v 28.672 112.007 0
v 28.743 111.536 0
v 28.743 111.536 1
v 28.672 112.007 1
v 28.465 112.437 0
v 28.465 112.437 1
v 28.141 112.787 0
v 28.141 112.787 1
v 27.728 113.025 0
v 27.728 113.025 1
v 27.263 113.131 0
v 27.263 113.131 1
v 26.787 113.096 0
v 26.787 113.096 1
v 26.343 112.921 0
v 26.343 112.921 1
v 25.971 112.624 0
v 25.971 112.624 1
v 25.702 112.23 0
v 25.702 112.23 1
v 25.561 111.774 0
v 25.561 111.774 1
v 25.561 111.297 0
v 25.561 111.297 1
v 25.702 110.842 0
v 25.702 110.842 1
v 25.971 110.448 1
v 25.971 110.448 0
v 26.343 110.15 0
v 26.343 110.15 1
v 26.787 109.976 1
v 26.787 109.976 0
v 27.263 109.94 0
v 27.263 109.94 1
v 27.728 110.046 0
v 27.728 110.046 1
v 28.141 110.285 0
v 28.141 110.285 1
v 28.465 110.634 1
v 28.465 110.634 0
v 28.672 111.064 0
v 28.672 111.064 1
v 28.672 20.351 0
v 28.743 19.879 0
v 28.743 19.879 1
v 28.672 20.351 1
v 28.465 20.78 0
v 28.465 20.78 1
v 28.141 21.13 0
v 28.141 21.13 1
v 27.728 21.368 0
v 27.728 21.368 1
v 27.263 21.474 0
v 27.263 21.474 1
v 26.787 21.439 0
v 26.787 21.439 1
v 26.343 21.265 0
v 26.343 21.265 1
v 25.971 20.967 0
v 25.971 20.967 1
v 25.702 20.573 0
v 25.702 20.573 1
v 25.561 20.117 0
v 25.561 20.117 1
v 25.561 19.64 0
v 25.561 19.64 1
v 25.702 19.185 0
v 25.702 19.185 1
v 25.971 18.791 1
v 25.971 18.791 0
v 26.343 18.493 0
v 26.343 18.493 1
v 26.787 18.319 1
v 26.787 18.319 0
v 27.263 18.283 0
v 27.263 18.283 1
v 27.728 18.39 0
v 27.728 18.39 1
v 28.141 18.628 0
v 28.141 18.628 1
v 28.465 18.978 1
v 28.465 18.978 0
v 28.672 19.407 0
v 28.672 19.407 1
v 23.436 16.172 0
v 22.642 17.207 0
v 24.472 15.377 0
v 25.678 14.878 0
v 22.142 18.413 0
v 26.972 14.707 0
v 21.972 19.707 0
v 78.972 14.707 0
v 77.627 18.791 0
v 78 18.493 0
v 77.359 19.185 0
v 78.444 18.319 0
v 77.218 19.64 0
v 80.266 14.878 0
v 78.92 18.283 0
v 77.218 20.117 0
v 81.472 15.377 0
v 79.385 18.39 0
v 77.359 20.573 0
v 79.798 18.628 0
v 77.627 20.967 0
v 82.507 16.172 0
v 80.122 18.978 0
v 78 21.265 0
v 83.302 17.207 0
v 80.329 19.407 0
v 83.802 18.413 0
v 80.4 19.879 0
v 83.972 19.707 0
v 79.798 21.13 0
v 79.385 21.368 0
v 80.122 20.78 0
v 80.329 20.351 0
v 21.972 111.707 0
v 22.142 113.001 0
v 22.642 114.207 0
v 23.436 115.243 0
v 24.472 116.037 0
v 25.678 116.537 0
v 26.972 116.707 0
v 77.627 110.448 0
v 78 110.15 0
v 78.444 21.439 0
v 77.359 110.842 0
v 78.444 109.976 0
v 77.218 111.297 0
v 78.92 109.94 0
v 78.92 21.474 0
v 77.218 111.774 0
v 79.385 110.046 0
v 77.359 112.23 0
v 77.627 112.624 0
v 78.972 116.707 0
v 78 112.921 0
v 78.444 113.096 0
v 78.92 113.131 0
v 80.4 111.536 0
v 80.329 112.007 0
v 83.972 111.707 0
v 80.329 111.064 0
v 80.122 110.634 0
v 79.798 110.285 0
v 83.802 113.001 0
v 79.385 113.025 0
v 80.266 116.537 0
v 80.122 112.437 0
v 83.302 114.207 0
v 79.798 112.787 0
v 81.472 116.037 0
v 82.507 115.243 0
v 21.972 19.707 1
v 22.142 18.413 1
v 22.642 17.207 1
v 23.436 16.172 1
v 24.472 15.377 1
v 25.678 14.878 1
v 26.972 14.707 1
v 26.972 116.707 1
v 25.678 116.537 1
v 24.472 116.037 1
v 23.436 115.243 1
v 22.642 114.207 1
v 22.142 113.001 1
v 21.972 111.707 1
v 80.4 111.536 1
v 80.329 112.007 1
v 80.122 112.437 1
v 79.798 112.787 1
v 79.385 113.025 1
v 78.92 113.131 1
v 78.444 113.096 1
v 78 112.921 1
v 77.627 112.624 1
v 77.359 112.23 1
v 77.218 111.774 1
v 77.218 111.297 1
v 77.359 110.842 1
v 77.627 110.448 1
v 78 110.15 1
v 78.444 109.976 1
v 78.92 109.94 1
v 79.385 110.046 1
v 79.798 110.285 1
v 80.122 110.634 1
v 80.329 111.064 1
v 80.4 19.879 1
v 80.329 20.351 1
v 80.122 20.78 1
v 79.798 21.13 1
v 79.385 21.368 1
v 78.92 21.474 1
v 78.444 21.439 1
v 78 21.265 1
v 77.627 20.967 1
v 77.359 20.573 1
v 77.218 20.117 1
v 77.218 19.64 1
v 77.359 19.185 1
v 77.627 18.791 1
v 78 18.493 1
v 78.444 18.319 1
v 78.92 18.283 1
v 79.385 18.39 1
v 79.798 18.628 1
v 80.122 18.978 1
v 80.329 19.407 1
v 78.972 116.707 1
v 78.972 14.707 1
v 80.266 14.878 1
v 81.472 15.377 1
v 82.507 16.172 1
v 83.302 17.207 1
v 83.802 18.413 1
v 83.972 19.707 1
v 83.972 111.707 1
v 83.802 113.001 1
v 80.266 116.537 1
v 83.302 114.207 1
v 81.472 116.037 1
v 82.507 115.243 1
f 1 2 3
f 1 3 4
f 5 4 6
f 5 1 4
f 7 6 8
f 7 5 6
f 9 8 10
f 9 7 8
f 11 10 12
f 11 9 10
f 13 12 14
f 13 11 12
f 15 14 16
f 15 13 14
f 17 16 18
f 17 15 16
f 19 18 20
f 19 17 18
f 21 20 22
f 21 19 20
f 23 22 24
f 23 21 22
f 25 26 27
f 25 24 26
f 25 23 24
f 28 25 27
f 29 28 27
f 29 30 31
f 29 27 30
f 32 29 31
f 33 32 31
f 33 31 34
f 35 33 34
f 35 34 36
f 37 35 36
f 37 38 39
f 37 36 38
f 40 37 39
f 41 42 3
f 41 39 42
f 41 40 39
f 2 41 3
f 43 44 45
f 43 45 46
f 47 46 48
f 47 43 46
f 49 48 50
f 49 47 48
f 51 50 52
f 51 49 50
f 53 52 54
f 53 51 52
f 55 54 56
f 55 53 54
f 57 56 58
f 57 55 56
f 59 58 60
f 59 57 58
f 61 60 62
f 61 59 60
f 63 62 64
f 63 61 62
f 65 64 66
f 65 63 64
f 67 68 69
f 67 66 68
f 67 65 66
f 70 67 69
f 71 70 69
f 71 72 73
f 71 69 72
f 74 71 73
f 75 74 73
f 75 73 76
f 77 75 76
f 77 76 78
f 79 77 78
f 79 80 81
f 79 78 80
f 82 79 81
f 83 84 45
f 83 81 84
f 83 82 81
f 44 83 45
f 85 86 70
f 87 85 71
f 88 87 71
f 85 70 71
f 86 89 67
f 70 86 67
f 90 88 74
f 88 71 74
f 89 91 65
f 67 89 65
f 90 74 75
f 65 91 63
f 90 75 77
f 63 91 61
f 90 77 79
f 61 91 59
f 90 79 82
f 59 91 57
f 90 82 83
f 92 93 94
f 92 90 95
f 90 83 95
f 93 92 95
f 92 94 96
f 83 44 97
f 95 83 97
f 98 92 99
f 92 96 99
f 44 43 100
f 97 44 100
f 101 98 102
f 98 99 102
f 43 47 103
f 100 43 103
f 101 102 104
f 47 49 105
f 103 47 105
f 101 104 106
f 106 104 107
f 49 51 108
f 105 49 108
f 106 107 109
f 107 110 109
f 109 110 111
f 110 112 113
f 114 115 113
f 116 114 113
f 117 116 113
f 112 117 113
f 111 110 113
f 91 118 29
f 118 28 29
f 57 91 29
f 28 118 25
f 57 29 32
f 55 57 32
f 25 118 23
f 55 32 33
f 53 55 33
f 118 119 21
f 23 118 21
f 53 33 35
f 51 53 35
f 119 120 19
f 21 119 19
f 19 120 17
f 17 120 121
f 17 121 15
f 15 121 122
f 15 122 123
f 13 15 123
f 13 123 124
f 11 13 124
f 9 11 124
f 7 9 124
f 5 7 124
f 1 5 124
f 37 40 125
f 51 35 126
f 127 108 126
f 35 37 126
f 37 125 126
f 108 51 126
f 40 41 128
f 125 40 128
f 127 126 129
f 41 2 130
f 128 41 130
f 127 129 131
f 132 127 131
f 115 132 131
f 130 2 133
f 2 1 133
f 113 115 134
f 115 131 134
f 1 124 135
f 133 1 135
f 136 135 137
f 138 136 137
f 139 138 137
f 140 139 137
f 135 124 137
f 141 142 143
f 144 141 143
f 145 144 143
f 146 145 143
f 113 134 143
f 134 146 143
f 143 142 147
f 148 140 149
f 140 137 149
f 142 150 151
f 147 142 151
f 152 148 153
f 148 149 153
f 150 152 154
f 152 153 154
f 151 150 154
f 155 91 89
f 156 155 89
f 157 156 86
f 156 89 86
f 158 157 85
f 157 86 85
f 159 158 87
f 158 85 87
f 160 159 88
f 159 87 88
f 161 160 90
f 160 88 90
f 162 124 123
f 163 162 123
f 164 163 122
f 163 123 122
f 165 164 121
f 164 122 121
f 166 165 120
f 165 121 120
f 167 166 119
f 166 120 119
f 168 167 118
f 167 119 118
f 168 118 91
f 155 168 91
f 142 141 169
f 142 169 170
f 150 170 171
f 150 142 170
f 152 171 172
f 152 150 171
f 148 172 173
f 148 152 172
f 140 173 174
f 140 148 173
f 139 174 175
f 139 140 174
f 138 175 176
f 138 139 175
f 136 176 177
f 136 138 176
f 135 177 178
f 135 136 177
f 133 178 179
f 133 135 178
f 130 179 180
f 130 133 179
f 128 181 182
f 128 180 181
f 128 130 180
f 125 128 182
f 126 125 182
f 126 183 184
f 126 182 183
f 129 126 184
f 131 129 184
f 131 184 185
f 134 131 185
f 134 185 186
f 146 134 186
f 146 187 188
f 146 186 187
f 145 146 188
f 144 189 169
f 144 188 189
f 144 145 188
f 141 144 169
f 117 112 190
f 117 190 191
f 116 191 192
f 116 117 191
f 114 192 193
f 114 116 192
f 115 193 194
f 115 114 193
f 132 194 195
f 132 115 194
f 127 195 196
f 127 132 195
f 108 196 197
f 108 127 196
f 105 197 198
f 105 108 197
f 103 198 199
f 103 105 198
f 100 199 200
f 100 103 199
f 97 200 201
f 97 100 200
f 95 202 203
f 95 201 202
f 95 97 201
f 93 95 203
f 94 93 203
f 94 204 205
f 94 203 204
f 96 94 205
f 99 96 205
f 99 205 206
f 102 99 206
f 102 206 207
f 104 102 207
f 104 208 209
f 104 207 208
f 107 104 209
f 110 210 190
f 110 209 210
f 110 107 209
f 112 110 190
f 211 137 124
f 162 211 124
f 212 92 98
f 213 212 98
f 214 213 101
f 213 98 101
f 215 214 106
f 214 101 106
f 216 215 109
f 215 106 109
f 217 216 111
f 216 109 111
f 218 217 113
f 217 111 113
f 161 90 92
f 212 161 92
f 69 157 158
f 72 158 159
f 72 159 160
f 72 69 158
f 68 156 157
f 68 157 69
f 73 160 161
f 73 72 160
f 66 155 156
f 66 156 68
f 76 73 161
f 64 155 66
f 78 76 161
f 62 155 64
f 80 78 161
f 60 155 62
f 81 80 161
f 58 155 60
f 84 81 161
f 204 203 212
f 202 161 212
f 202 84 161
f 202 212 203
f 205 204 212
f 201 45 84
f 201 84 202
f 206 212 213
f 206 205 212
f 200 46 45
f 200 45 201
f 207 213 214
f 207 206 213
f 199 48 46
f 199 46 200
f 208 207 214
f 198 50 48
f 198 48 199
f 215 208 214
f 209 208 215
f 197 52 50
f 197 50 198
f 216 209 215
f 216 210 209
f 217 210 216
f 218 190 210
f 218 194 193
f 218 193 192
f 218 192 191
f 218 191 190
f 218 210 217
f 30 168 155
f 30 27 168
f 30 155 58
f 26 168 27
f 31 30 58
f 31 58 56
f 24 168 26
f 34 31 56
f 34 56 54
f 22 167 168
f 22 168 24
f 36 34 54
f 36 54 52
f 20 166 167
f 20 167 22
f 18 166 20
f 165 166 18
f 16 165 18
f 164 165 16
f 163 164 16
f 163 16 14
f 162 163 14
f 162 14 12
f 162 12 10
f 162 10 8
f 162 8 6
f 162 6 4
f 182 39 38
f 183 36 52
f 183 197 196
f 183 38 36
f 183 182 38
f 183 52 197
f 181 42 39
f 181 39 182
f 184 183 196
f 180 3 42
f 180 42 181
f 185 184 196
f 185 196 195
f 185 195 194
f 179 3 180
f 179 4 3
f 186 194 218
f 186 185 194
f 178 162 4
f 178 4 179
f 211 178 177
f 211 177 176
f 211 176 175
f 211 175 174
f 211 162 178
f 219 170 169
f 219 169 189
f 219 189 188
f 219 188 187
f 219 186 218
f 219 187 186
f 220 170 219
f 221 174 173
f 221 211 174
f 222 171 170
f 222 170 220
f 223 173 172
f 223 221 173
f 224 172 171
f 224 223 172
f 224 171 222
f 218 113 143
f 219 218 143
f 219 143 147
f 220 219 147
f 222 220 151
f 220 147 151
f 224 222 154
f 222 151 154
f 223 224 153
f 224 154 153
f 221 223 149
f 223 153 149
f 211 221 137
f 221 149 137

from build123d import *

# Parameters (mm, degrees)
BOSS_EXTRU_1_DEPTH           = 1
ENL_V_MAT_EXTRU_1_DEPTH      = 144.780695976
ENL_V_MAT_EXTRU_1_DEPTH_BACK = 144.780695976
ESQUISSE2_R                  = 1.6


with BuildPart() as part:
    # Esquisse1 → Boss.-Extru.1 (new body)
    with BuildSketch(Plane.XY):
        with BuildLine():
            Line((26.971910928, 14.707354998), (78.971910928, 14.707354998))
            ThreePointArc((78.971910928, 14.707354998), (82.507444834, 16.171821092), (83.971910928, 19.707354998))
            Line((83.971910928, 19.707354998), (83.971910928, 111.707354998))
            ThreePointArc((83.971910928, 111.707354998), (82.507444834, 115.242888904), (78.971910928, 116.707354998))
            Line((78.971910928, 116.707354998), (26.971910928, 116.707354998))
            ThreePointArc((26.971910928, 116.707354998), (23.436377022, 115.242888904), (21.971910928, 111.707354998))
            Line((21.971910928, 111.707354998), (21.971910928, 19.707354998))
            ThreePointArc((21.971910928, 19.707354998), (23.436377022, 16.171821092), (26.971910928, 14.707354998))
        make_face()
    extrude(amount=BOSS_EXTRU_1_DEPTH)

    # Esquisse2 → Enlèv. mat.-Extru.1 (cut, two sides: drawn at the far end of the back side and taken through both)
    with BuildSketch(Plane.XY.offset(1).offset(-ENL_V_MAT_EXTRU_1_DEPTH_BACK)):
        with Locations((27.143483803, 19.878927873)):
            Circle(ESQUISSE2_R)
        with Locations((78.800338052, 19.878927873)):
            Circle(ESQUISSE2_R)
        with Locations((27.143483803, 111.535782123)):
            Circle(ESQUISSE2_R)
        with Locations((78.800338052, 111.535782123)):
            Circle(ESQUISSE2_R)
    extrude(amount=ENL_V_MAT_EXTRU_1_DEPTH + ENL_V_MAT_EXTRU_1_DEPTH_BACK, mode=Mode.SUBTRACT)


solid = part.part
